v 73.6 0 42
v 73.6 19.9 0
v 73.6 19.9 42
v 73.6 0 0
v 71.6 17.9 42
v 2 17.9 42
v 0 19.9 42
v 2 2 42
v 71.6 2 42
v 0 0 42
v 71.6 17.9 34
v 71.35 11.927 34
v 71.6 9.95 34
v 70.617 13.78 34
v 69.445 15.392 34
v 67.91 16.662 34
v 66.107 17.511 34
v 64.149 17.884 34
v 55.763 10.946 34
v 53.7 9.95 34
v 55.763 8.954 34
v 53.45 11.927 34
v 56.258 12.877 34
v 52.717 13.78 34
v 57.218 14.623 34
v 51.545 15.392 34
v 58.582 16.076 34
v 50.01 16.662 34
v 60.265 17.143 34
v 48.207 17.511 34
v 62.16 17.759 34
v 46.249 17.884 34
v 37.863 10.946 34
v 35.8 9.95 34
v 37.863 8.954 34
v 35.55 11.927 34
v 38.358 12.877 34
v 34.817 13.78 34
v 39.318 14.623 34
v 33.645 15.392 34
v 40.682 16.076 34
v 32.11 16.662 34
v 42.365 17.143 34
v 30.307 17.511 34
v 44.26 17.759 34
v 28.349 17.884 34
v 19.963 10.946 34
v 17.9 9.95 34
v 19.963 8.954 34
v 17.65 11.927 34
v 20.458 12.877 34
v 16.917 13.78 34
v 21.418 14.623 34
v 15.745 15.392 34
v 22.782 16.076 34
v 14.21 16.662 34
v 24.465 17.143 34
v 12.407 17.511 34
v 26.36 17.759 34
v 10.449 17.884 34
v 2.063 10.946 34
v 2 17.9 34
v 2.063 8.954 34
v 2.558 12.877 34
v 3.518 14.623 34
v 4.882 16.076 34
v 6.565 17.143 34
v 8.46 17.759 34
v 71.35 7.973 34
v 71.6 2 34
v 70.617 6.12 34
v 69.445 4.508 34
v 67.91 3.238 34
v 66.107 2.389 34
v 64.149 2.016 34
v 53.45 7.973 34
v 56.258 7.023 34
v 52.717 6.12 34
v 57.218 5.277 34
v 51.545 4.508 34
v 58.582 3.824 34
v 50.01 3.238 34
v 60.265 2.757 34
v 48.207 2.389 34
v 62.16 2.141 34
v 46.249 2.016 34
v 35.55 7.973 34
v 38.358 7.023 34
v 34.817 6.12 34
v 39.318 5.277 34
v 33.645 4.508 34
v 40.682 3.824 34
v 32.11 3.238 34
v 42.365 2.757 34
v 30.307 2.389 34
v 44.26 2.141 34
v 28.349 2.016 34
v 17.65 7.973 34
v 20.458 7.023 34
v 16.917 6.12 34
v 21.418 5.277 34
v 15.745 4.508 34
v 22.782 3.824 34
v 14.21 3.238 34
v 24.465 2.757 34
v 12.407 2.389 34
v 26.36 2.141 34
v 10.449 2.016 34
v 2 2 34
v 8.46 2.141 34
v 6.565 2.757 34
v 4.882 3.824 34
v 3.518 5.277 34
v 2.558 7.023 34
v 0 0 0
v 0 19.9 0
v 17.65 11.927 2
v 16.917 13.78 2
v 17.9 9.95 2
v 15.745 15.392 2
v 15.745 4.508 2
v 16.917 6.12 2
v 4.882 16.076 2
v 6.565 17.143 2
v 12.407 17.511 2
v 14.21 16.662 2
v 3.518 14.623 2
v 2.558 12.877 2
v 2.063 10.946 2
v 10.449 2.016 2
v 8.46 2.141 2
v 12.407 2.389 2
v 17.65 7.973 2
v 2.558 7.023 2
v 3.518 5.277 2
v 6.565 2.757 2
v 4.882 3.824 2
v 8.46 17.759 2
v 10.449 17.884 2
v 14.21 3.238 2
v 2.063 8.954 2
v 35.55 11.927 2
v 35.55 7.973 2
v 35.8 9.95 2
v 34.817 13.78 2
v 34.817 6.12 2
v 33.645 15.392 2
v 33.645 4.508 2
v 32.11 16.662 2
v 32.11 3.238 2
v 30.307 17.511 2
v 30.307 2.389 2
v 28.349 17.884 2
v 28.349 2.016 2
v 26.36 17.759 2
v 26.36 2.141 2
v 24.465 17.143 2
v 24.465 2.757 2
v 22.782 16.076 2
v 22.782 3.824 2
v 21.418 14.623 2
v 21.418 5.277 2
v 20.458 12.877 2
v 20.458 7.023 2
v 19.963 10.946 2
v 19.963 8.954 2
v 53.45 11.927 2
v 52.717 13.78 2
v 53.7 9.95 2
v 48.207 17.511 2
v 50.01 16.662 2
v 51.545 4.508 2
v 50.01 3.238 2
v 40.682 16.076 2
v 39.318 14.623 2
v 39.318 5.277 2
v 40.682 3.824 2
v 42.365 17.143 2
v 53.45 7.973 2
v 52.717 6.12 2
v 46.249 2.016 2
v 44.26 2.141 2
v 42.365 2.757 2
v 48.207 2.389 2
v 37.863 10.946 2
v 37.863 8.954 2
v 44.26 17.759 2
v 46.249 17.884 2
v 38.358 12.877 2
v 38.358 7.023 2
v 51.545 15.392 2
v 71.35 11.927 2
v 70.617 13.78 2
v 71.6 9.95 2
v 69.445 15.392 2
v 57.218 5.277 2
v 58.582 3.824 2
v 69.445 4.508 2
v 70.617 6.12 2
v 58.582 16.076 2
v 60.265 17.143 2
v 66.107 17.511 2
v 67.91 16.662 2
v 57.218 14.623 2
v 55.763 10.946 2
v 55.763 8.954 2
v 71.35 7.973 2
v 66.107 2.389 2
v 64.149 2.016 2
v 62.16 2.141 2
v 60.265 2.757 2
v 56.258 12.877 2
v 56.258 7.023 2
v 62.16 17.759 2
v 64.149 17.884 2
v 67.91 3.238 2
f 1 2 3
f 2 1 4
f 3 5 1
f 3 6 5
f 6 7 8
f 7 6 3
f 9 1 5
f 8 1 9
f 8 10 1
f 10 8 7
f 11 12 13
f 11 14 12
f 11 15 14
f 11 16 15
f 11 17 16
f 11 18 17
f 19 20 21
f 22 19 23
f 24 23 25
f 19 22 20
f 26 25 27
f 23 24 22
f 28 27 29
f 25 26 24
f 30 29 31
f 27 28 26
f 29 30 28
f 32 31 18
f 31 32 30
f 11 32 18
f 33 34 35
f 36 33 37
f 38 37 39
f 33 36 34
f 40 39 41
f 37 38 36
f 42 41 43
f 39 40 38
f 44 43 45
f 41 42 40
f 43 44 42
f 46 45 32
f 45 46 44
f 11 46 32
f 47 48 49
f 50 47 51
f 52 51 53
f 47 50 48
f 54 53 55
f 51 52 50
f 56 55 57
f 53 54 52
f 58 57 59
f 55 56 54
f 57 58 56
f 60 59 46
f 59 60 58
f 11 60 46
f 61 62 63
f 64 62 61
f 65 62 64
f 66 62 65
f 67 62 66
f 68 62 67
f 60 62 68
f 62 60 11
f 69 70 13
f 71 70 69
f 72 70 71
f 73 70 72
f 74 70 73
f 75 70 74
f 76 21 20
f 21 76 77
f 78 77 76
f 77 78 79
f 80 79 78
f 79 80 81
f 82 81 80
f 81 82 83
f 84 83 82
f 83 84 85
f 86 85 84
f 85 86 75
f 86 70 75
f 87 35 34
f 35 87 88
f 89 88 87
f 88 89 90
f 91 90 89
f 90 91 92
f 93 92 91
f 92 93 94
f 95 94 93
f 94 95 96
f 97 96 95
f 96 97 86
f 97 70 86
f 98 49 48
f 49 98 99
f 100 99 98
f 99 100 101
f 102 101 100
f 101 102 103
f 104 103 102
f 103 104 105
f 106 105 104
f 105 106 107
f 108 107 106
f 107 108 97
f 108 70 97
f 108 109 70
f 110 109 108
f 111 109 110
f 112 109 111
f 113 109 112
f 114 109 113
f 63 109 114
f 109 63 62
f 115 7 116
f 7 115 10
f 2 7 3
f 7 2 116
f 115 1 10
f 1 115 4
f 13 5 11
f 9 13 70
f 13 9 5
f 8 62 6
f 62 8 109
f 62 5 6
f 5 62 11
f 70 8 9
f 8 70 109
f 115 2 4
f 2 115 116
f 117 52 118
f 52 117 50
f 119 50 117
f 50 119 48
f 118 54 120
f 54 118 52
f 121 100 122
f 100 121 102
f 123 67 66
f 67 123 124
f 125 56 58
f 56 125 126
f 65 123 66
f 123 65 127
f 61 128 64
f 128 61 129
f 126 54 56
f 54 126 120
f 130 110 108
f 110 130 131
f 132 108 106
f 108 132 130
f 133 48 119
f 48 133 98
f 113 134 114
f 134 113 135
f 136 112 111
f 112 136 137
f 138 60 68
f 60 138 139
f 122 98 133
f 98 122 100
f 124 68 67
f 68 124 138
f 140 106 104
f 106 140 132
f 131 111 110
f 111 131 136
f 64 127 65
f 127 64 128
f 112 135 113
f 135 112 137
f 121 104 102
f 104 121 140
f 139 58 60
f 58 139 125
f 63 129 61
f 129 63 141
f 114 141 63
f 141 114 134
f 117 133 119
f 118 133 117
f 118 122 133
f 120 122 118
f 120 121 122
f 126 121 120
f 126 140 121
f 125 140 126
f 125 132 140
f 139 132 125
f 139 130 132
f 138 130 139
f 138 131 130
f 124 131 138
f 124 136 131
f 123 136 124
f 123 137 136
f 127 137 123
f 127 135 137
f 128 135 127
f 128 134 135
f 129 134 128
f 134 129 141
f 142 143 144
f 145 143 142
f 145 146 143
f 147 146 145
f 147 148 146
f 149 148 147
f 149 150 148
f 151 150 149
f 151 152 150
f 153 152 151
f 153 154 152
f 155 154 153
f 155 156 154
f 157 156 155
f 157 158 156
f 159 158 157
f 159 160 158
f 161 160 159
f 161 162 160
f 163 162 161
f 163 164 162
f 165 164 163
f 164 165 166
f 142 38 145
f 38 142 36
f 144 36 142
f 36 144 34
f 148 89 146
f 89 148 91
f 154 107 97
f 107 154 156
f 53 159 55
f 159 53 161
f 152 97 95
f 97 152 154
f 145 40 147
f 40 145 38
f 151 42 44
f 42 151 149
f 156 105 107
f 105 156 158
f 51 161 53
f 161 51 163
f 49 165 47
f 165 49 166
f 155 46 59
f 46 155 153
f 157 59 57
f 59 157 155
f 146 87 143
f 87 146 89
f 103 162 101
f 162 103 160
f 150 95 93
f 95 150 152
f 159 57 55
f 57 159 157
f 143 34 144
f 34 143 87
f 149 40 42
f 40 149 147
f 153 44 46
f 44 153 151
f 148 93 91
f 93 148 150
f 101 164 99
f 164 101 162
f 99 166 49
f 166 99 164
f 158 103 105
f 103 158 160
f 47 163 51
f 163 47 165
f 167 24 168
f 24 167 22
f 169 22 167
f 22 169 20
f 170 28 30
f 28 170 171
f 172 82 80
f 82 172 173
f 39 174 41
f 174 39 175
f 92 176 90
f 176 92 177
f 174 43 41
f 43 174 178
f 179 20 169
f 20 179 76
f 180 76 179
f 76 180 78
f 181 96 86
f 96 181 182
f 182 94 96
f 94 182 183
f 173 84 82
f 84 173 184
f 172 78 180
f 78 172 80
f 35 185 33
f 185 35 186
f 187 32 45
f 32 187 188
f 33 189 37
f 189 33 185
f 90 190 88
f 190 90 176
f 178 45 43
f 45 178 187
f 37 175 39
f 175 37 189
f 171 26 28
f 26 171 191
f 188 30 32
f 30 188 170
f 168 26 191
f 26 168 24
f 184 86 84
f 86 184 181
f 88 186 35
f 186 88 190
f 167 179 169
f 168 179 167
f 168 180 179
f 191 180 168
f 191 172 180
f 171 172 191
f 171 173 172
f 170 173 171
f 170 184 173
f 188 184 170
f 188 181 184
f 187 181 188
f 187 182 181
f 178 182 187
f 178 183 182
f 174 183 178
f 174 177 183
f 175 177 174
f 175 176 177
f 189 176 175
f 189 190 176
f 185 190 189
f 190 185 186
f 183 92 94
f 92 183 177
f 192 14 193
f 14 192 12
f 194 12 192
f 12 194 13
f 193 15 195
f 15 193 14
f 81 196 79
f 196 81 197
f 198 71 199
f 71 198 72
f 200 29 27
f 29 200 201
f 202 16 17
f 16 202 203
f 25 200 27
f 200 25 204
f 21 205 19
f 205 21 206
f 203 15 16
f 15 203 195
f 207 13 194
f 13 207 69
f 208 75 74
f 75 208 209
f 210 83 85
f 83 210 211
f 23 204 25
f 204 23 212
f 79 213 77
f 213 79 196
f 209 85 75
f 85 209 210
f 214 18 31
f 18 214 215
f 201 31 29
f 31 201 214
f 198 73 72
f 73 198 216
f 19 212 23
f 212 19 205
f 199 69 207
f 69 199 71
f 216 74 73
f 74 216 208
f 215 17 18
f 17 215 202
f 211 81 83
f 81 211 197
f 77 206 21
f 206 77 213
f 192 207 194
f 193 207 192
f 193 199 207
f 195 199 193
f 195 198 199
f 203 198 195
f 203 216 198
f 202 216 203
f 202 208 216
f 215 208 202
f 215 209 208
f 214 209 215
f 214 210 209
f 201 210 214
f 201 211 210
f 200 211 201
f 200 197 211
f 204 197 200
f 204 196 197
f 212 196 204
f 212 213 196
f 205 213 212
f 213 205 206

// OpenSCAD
// orcad: tray that holds a row of cells (AA, AAA, 18650 or a 9 V block battery) in pockets.
cell_type = 0; // [0:AA, 1:AAA, 2:18650, 3:9V block]
cell_count = 4;
cell_clearance = 0.7;
pocket_depth = 32;
floor_thickness = 2;
wall_height = 8;
wall_thickness = 2;

// Nominal cell width and length in mm: AA, AAA, 18650 and a 9 V block lying flat.
cells = [[14.5, 50.5], [10.5, 44.5], [18.6, 65], [26.5, 48.5]];
block_cell = cell_type == 3;
cell_width = cells[cell_type][0];
cell_length = cells[cell_type][1];

pocket_x = (block_cell ? cell_length : cell_width) + 2 * cell_clearance;
pocket_y = cell_width + 2 * cell_clearance;
base_x = cell_count * pocket_x + (cell_count + 1) * wall_thickness;
base_y = pocket_y + 2 * wall_thickness;
base_height = floor_thickness + pocket_depth;

difference() {
    union() {
        cube([base_x, base_y, base_height]);

        // Rim around the tray, so the cells cannot fall out.
        translate([0, 0, base_height])
            difference() {
                cube([base_x, base_y, wall_height]);
                translate([wall_thickness, wall_thickness, -0.01])
                    cube([base_x - 2 * wall_thickness, base_y - 2 * wall_thickness, wall_height + 0.02]);
            }
    }

    for (i = [0 : cell_count - 1])
        translate([wall_thickness + i * (pocket_x + wall_thickness) + pocket_x / 2, base_y / 2, 0])
            if (block_cell)
                translate([-pocket_x / 2, -pocket_y / 2, floor_thickness])
                    cube([pocket_x, pocket_y, pocket_depth]);
            else
                translate([0, 0, floor_thickness]) cylinder(d = pocket_x, h = pocket_depth);
}
